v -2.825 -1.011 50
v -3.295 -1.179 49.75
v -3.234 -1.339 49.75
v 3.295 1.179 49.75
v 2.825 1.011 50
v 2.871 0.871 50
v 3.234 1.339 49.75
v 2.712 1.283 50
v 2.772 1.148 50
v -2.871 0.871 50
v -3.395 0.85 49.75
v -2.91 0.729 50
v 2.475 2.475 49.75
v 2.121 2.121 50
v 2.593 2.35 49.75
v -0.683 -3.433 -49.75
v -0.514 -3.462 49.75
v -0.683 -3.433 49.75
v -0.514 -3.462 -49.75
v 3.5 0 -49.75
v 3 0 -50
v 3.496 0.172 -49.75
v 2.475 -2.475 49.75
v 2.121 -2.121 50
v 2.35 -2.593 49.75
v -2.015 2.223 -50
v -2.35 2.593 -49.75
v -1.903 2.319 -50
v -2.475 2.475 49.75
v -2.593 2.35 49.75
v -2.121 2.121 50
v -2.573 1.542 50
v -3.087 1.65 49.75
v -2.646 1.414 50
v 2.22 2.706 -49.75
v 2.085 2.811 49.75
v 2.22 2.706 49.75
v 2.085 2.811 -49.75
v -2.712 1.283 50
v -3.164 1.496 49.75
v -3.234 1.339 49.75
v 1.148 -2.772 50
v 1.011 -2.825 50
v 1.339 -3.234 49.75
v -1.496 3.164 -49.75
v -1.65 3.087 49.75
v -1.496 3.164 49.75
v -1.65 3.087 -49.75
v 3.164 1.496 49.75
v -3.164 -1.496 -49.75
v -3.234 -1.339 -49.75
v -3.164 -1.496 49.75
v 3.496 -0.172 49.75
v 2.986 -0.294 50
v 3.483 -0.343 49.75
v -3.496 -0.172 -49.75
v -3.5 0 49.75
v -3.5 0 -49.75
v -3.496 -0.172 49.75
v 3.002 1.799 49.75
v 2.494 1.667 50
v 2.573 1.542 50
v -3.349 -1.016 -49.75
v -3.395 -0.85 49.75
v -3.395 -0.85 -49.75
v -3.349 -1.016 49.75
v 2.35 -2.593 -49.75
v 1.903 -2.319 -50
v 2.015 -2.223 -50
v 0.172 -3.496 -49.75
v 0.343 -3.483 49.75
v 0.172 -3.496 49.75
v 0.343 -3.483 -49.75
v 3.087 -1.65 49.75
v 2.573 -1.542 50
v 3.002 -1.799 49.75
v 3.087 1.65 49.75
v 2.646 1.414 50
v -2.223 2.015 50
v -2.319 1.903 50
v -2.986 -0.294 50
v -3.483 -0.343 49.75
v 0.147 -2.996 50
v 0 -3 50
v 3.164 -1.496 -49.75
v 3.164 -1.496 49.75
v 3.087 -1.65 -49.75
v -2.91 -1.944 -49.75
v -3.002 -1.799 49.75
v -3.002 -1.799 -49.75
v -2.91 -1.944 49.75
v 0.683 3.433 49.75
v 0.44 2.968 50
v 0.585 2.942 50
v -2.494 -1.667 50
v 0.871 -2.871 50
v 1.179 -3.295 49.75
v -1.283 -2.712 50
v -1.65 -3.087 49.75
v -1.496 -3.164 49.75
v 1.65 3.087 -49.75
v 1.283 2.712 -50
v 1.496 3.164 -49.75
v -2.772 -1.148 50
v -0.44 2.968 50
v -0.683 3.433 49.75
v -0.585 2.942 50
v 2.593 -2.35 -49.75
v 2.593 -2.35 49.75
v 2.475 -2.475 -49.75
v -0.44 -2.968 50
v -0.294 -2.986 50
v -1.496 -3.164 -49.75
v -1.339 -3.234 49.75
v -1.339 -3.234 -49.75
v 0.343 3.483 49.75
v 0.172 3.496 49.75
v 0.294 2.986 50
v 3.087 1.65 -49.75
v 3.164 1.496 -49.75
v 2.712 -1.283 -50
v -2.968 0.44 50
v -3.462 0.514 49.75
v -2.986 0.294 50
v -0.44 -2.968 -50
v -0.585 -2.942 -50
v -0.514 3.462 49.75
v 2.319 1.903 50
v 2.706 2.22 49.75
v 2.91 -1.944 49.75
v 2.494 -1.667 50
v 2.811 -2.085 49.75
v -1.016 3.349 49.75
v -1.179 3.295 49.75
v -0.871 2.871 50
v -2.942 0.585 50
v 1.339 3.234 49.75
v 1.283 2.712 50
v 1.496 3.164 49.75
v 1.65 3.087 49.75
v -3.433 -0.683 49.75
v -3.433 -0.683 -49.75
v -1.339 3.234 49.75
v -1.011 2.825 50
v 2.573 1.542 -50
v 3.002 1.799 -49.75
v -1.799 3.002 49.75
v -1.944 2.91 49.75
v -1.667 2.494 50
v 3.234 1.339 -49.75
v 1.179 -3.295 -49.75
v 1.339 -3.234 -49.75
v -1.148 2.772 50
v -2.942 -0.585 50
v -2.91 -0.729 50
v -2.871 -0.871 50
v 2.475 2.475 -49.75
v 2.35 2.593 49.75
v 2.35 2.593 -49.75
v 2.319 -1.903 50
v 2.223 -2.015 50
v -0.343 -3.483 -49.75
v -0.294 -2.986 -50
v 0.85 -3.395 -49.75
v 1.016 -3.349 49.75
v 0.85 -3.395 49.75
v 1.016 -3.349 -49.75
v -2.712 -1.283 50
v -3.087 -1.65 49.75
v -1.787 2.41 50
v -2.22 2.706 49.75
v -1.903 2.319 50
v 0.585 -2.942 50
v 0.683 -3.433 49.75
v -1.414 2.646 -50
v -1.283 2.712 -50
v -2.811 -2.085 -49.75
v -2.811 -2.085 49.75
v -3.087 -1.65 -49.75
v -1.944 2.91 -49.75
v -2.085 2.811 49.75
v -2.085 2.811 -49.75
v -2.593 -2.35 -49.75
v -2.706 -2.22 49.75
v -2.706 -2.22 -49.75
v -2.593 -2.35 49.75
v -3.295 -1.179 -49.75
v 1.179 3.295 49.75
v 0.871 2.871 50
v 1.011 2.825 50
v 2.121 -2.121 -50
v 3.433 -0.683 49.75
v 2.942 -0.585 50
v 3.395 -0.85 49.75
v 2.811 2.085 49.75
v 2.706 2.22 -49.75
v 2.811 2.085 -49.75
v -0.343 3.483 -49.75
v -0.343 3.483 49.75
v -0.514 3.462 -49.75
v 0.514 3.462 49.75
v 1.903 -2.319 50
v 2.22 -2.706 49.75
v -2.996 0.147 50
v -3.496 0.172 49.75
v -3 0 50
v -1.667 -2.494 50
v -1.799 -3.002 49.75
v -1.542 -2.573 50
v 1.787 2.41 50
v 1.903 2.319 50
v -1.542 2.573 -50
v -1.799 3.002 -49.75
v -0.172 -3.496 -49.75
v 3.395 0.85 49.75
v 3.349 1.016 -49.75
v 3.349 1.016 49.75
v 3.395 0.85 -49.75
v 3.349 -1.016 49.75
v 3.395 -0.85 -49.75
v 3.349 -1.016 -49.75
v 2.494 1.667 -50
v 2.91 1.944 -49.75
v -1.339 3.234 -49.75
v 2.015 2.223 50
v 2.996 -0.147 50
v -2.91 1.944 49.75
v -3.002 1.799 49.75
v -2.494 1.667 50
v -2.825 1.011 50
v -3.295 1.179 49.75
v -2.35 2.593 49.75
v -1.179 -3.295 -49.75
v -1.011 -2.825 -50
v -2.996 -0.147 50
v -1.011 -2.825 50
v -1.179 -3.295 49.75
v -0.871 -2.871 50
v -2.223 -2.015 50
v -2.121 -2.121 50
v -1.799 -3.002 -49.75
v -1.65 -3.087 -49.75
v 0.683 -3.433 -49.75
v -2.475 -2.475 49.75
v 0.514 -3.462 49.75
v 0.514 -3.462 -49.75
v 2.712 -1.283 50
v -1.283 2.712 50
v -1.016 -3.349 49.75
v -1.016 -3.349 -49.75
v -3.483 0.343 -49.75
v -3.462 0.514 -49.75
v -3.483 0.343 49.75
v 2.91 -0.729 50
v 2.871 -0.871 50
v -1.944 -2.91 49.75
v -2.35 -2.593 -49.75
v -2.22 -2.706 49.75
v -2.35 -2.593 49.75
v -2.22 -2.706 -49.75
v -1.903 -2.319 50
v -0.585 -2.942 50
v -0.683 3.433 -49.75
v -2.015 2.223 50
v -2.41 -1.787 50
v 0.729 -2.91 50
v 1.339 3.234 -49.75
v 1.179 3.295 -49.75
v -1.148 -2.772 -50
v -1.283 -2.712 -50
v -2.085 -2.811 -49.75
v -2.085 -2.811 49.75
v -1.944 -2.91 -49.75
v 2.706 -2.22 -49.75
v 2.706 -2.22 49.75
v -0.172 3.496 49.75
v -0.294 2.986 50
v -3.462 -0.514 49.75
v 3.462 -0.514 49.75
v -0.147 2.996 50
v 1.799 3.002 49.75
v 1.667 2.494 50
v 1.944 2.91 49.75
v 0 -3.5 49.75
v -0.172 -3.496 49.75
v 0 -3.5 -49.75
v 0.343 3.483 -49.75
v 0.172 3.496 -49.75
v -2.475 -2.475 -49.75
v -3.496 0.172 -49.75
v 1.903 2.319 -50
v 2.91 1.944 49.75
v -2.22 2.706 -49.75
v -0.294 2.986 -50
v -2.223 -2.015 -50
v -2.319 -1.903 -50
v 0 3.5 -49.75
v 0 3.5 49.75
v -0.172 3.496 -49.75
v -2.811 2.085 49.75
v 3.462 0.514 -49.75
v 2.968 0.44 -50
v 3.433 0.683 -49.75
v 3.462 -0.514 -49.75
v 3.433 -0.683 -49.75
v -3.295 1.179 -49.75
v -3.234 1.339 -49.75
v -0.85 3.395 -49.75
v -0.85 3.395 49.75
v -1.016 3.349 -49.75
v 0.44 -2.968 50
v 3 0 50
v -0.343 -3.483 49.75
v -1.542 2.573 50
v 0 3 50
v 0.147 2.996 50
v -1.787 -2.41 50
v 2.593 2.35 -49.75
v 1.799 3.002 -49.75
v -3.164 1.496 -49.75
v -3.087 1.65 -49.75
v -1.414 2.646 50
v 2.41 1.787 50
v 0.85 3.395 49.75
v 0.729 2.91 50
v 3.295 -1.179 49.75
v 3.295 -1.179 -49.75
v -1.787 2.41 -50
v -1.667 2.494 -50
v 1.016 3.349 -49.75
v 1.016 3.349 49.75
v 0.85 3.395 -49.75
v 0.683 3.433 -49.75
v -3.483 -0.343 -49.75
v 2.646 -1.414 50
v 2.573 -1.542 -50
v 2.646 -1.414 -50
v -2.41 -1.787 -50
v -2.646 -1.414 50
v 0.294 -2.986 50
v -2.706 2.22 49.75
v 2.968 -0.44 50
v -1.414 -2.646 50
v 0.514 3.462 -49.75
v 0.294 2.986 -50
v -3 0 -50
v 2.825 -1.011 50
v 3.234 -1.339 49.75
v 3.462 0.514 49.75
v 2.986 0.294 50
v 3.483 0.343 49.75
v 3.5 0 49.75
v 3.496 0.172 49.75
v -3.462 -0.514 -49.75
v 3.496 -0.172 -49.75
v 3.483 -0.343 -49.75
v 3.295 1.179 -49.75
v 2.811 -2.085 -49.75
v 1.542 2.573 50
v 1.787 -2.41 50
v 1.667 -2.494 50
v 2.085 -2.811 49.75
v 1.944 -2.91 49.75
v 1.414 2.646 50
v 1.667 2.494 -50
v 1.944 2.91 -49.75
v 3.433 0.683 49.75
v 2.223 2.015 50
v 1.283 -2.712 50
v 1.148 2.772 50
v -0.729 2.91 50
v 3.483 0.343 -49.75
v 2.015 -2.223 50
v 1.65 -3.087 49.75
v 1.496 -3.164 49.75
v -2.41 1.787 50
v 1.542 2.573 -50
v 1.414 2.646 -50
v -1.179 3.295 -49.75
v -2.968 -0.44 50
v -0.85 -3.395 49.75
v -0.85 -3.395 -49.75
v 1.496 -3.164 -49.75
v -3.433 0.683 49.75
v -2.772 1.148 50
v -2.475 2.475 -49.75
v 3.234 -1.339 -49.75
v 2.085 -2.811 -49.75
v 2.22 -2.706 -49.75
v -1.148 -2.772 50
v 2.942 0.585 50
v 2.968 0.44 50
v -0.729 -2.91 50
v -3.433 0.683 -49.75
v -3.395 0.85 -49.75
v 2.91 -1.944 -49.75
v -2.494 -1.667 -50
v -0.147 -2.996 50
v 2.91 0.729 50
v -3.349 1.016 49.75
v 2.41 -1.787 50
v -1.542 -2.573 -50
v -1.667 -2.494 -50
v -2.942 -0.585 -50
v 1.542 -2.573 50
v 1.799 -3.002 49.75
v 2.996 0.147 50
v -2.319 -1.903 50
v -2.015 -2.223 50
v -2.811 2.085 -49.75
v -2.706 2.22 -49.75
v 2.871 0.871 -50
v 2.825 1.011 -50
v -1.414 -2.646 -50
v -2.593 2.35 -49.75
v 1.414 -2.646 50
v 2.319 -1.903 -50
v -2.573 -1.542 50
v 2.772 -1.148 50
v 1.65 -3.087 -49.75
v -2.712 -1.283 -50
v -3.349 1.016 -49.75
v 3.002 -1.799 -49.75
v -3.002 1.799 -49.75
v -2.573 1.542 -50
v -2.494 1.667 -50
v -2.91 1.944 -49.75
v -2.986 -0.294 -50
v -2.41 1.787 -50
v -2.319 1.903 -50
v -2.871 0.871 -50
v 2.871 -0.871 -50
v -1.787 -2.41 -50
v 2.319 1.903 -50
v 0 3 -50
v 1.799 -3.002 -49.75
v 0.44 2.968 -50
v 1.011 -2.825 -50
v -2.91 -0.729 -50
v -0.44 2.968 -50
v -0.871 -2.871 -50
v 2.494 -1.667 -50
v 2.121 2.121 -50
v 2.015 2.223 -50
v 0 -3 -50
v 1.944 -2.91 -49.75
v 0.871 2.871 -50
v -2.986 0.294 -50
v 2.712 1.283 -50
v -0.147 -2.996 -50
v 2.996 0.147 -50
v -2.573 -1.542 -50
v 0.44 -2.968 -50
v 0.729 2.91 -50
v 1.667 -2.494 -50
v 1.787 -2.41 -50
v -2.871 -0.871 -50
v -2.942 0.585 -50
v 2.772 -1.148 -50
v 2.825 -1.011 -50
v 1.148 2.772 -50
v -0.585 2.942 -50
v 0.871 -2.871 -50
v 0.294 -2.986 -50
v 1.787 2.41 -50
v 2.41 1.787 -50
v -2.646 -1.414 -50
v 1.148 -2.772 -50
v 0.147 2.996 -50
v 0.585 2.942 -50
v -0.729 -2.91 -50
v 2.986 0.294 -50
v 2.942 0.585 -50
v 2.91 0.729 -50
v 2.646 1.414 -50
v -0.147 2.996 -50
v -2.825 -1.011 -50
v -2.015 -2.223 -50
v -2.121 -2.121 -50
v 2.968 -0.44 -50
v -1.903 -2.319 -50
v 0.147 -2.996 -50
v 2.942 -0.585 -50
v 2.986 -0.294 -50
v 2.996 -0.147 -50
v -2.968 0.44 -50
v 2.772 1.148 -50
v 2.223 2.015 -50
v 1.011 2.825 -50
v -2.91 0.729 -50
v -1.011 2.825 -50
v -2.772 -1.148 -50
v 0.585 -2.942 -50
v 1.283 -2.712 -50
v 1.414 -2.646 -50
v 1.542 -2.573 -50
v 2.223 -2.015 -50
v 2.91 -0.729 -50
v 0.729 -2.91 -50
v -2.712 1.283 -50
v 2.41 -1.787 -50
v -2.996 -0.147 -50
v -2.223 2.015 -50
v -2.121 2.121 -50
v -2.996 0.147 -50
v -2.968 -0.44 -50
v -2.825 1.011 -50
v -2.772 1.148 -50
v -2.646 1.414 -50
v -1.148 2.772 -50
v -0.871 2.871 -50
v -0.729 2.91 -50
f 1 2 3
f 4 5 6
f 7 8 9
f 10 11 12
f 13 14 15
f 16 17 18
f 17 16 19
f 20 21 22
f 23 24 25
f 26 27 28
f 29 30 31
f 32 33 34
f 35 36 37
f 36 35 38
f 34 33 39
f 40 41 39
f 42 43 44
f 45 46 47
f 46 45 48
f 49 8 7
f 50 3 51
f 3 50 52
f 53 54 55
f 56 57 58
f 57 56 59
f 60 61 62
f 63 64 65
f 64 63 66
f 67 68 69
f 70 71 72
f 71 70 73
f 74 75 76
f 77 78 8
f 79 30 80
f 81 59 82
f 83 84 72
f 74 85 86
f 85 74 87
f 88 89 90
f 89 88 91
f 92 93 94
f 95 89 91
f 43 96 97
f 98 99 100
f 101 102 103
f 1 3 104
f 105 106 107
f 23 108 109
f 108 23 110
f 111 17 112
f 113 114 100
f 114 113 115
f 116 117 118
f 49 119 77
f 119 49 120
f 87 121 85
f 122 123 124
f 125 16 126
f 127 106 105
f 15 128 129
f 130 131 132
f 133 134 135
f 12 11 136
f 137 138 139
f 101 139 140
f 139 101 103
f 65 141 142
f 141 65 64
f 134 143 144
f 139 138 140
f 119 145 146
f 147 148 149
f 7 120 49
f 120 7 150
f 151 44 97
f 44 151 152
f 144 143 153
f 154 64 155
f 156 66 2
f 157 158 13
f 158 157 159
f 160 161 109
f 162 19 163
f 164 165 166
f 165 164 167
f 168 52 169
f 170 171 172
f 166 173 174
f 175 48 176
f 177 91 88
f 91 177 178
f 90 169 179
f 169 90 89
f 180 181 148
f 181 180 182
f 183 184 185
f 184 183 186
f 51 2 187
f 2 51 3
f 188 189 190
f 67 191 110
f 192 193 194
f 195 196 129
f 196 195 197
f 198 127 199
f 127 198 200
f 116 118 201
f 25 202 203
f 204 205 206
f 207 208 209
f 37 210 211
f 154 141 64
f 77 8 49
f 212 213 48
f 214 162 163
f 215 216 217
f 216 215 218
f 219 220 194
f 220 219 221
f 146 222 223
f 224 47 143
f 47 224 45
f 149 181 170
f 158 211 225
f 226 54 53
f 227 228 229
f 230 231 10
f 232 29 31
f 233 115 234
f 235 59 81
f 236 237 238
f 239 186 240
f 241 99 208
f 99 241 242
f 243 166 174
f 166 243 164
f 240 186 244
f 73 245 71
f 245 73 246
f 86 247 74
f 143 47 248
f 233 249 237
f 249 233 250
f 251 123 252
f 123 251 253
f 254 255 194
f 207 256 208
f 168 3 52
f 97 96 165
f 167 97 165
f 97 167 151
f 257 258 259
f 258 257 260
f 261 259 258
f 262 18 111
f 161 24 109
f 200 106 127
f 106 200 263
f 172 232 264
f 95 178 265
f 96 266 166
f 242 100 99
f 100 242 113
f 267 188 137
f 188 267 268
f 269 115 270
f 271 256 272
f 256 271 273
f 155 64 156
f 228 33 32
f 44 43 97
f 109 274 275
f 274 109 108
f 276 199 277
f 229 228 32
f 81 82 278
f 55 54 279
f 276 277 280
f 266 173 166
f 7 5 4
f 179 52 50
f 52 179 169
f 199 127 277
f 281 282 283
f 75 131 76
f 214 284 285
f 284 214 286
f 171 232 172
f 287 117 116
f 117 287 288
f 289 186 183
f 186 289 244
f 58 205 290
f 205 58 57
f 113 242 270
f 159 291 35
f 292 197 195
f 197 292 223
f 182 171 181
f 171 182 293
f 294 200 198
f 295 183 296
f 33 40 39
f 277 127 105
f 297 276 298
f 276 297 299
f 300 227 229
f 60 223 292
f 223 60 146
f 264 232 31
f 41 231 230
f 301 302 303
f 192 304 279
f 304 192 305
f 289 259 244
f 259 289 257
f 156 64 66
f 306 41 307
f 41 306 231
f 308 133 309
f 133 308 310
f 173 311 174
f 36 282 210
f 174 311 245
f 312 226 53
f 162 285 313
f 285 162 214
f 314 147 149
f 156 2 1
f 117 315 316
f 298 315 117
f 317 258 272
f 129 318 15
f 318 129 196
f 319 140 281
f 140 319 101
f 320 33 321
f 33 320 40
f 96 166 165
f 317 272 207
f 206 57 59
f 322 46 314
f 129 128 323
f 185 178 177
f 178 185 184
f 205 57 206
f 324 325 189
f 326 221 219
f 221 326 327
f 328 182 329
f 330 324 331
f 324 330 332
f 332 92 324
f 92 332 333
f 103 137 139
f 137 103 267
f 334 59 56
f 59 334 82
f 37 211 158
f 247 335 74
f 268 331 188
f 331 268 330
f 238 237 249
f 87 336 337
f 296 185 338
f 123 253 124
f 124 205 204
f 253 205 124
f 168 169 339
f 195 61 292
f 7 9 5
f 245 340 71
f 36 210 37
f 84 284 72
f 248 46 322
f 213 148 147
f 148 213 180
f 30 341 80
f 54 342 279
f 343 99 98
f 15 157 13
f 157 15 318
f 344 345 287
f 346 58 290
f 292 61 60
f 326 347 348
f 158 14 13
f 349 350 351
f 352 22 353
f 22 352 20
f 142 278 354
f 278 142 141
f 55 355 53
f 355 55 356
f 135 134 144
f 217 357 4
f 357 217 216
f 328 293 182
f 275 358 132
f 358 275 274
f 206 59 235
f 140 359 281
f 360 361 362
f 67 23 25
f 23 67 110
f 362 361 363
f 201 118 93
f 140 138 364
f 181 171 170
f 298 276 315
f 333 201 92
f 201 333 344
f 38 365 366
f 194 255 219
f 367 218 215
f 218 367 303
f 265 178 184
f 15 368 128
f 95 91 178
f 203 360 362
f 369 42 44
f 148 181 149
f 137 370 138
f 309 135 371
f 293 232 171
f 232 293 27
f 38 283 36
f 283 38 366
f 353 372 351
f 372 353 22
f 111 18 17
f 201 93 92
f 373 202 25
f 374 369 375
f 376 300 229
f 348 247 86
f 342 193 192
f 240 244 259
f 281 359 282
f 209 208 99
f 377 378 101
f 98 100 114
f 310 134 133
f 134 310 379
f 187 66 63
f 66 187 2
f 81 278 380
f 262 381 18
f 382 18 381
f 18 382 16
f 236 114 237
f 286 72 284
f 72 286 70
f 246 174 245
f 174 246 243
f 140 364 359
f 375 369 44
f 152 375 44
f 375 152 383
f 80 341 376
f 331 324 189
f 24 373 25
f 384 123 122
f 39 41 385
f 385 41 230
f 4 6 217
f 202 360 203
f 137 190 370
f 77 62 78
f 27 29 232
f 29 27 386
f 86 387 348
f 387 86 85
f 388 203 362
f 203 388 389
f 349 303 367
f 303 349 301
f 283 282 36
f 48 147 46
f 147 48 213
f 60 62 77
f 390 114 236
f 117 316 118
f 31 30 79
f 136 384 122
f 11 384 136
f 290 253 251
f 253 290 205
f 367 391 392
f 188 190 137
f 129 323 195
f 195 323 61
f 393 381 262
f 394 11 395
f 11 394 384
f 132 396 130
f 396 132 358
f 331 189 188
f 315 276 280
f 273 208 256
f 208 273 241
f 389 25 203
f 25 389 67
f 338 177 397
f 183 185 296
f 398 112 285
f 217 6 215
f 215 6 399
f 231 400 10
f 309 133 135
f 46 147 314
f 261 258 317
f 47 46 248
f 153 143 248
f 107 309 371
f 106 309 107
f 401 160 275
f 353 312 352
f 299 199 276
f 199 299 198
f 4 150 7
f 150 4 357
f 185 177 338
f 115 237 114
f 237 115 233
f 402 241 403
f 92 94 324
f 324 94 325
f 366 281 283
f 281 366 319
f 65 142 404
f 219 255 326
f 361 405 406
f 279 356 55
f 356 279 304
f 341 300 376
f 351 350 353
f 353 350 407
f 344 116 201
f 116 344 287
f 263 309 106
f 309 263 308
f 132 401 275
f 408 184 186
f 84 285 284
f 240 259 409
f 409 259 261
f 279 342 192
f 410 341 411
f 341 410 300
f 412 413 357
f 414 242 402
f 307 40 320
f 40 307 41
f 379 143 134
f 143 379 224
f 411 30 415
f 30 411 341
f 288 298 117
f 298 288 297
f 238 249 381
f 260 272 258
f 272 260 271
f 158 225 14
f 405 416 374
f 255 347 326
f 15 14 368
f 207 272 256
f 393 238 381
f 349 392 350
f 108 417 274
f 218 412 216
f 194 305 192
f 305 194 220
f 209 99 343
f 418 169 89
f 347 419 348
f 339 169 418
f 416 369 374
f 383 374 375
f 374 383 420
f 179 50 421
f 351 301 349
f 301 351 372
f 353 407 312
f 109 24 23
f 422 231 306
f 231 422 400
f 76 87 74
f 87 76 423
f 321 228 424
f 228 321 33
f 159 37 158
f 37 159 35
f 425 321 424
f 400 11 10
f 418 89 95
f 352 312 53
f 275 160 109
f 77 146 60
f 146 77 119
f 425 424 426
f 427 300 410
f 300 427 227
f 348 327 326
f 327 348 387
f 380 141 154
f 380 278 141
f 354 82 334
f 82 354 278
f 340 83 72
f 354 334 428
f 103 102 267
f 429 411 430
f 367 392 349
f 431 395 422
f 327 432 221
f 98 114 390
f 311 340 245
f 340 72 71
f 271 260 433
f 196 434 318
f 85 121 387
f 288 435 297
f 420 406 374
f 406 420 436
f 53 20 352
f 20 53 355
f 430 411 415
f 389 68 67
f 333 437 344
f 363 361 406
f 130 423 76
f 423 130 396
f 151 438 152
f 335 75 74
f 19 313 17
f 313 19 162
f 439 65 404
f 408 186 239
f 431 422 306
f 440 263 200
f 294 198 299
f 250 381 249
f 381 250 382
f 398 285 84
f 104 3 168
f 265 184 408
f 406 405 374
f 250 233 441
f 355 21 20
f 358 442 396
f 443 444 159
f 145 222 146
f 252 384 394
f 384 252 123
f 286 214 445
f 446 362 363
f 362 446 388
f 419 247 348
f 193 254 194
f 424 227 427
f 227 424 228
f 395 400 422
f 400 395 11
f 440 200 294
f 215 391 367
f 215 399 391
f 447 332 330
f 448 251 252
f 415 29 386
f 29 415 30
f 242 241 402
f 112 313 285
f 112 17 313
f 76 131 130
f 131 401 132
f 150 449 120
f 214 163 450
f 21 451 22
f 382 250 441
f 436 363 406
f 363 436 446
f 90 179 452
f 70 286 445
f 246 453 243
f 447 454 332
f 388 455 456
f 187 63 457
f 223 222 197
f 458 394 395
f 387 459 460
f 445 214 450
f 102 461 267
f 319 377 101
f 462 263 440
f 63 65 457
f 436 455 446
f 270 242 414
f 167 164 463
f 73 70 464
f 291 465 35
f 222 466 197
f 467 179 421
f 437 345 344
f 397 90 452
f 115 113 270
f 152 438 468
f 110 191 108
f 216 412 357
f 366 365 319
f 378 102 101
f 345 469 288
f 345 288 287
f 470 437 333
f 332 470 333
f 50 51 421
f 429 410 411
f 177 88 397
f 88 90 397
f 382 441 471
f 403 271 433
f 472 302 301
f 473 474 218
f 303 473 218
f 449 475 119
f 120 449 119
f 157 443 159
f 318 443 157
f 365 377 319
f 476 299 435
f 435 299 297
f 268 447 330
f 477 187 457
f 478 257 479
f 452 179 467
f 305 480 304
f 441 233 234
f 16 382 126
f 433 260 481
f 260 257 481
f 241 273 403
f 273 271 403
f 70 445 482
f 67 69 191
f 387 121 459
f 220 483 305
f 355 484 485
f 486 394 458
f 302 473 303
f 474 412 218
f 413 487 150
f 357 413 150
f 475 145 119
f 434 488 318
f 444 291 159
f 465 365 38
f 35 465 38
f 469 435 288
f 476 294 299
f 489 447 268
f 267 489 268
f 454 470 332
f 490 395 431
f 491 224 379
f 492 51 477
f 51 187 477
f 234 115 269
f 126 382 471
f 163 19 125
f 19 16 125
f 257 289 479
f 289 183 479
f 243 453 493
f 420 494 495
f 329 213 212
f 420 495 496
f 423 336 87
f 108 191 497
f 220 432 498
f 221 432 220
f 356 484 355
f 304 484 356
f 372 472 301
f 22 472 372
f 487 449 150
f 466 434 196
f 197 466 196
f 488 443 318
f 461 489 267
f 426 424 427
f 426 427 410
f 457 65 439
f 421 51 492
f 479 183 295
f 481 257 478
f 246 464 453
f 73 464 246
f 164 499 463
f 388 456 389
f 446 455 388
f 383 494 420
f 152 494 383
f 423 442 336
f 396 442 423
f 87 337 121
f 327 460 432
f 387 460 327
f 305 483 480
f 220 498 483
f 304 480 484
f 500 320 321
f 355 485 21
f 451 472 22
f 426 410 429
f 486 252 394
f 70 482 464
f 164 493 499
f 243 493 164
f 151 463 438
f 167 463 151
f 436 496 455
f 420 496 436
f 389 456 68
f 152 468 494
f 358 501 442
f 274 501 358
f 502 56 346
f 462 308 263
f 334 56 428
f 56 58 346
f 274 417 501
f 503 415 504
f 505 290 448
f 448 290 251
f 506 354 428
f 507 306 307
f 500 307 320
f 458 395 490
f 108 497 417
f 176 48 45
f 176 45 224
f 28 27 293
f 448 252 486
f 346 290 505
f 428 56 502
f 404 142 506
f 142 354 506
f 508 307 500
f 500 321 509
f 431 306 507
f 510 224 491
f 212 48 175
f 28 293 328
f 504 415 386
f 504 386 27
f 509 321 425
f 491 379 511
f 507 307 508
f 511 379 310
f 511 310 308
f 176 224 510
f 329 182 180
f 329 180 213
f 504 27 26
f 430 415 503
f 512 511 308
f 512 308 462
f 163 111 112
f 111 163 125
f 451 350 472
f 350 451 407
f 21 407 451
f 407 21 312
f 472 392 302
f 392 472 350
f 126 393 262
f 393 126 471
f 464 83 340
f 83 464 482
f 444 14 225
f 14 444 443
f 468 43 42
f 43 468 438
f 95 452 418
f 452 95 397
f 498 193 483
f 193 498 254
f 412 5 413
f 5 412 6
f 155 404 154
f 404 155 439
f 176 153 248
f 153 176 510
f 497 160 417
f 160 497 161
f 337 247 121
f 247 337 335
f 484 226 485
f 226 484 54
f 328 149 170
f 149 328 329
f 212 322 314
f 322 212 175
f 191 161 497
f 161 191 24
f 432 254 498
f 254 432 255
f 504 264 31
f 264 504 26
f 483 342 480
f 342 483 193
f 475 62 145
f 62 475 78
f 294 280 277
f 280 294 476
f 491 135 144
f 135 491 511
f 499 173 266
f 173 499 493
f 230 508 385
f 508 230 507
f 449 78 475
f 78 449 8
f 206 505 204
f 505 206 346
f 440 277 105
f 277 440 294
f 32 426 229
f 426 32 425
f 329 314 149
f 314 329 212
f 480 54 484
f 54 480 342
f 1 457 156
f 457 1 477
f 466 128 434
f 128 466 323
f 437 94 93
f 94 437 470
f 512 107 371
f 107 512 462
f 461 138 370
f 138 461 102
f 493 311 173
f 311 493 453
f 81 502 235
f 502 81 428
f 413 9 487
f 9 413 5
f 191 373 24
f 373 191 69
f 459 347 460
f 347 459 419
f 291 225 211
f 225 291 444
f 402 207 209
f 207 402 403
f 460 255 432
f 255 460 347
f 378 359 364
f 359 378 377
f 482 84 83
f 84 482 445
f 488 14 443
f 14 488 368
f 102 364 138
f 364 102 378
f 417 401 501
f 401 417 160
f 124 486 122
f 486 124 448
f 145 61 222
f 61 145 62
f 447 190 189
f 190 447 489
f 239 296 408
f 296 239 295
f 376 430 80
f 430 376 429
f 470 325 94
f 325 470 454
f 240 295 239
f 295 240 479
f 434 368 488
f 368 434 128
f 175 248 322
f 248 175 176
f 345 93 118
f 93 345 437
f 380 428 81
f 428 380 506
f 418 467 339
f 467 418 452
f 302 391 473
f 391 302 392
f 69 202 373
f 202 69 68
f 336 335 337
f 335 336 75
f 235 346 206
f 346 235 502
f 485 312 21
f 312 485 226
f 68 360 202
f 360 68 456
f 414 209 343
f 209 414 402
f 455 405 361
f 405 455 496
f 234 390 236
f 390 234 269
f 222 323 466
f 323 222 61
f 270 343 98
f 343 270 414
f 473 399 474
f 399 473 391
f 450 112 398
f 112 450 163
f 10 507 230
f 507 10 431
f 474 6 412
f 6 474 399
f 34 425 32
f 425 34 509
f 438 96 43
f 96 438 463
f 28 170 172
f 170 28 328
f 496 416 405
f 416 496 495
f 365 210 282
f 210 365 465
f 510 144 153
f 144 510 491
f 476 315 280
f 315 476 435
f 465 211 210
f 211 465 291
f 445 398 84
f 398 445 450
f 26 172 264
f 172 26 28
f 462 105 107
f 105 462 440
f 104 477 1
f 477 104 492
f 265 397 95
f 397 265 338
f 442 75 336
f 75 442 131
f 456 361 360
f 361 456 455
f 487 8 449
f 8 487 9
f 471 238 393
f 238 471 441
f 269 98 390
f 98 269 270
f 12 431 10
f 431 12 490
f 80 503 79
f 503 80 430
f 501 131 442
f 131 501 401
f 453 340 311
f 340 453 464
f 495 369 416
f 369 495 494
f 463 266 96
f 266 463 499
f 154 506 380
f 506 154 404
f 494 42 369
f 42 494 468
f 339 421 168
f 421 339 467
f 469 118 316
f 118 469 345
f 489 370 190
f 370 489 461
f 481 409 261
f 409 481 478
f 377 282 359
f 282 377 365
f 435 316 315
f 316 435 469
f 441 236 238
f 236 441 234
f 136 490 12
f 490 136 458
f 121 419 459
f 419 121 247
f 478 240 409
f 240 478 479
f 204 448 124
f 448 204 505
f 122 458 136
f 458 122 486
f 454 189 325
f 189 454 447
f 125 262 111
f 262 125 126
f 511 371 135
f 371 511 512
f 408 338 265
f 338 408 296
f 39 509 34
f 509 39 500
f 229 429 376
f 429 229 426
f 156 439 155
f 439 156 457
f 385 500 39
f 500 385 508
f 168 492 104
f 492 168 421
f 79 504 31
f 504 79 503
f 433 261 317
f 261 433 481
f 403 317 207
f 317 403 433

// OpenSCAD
// PTFE heatshrink sleeving: simple hollow cylindrical tube (ONE connected solid)

// Parameters
tube_length     = 100;   //[50:200:1]
inner_diameter  = 6;     //[3:12:0.1]
wall_thickness  = 0.5;   //[0.25:1:0.05]
end_chamfer     = 0.5;   //[0:2:0.05]
overlap         = 0.2;   //[0.05:1:0.05]

// Derived
inner_r = inner_diameter/2;
outer_r = inner_r + wall_thickness;

// Quality
$fn = 128;

// Main tube (hollow)
module hollow_tube(h, r_out, r_in) {
    difference() {
        cylinder(h=h, r=r_out, center=true);
        cylinder(h=h + 2*overlap, r=r_in, center=true);
    }
}

// Optional subtle end chamfers (kept simple and robust)
module chamfered_hollow_tube(h, r_out, r_in, chamfer) {
    // If chamfer is zero or too large, fall back to plain tube
    safe_ch = min(chamfer, max(0, h/4));
    if (safe_ch <= 0) {
        hollow_tube(h, r_out, r_in);
    } else {
        difference() {
            // Outer with chamfered ends via hull of two slightly smaller cylinders
            hull() {
                translate([0,0,  h/2 - safe_ch/2]) cylinder(h=safe_ch, r=r_out - safe_ch, center=true);
                translate([0,0, -h/2 + safe_ch/2]) cylinder(h=safe_ch, r=r_out - safe_ch, center=true);
                cylinder(h=h - safe_ch, r=r_out, center=true);
            }
            // Inner bore straight through
            cylinder(h=h + 2*overlap, r=r_in, center=true);
        }
    }
}

// Final Output: ONE connected solid tube
chamfered_hollow_tube(tube_length, outer_r, inner_r, end_chamfer);
